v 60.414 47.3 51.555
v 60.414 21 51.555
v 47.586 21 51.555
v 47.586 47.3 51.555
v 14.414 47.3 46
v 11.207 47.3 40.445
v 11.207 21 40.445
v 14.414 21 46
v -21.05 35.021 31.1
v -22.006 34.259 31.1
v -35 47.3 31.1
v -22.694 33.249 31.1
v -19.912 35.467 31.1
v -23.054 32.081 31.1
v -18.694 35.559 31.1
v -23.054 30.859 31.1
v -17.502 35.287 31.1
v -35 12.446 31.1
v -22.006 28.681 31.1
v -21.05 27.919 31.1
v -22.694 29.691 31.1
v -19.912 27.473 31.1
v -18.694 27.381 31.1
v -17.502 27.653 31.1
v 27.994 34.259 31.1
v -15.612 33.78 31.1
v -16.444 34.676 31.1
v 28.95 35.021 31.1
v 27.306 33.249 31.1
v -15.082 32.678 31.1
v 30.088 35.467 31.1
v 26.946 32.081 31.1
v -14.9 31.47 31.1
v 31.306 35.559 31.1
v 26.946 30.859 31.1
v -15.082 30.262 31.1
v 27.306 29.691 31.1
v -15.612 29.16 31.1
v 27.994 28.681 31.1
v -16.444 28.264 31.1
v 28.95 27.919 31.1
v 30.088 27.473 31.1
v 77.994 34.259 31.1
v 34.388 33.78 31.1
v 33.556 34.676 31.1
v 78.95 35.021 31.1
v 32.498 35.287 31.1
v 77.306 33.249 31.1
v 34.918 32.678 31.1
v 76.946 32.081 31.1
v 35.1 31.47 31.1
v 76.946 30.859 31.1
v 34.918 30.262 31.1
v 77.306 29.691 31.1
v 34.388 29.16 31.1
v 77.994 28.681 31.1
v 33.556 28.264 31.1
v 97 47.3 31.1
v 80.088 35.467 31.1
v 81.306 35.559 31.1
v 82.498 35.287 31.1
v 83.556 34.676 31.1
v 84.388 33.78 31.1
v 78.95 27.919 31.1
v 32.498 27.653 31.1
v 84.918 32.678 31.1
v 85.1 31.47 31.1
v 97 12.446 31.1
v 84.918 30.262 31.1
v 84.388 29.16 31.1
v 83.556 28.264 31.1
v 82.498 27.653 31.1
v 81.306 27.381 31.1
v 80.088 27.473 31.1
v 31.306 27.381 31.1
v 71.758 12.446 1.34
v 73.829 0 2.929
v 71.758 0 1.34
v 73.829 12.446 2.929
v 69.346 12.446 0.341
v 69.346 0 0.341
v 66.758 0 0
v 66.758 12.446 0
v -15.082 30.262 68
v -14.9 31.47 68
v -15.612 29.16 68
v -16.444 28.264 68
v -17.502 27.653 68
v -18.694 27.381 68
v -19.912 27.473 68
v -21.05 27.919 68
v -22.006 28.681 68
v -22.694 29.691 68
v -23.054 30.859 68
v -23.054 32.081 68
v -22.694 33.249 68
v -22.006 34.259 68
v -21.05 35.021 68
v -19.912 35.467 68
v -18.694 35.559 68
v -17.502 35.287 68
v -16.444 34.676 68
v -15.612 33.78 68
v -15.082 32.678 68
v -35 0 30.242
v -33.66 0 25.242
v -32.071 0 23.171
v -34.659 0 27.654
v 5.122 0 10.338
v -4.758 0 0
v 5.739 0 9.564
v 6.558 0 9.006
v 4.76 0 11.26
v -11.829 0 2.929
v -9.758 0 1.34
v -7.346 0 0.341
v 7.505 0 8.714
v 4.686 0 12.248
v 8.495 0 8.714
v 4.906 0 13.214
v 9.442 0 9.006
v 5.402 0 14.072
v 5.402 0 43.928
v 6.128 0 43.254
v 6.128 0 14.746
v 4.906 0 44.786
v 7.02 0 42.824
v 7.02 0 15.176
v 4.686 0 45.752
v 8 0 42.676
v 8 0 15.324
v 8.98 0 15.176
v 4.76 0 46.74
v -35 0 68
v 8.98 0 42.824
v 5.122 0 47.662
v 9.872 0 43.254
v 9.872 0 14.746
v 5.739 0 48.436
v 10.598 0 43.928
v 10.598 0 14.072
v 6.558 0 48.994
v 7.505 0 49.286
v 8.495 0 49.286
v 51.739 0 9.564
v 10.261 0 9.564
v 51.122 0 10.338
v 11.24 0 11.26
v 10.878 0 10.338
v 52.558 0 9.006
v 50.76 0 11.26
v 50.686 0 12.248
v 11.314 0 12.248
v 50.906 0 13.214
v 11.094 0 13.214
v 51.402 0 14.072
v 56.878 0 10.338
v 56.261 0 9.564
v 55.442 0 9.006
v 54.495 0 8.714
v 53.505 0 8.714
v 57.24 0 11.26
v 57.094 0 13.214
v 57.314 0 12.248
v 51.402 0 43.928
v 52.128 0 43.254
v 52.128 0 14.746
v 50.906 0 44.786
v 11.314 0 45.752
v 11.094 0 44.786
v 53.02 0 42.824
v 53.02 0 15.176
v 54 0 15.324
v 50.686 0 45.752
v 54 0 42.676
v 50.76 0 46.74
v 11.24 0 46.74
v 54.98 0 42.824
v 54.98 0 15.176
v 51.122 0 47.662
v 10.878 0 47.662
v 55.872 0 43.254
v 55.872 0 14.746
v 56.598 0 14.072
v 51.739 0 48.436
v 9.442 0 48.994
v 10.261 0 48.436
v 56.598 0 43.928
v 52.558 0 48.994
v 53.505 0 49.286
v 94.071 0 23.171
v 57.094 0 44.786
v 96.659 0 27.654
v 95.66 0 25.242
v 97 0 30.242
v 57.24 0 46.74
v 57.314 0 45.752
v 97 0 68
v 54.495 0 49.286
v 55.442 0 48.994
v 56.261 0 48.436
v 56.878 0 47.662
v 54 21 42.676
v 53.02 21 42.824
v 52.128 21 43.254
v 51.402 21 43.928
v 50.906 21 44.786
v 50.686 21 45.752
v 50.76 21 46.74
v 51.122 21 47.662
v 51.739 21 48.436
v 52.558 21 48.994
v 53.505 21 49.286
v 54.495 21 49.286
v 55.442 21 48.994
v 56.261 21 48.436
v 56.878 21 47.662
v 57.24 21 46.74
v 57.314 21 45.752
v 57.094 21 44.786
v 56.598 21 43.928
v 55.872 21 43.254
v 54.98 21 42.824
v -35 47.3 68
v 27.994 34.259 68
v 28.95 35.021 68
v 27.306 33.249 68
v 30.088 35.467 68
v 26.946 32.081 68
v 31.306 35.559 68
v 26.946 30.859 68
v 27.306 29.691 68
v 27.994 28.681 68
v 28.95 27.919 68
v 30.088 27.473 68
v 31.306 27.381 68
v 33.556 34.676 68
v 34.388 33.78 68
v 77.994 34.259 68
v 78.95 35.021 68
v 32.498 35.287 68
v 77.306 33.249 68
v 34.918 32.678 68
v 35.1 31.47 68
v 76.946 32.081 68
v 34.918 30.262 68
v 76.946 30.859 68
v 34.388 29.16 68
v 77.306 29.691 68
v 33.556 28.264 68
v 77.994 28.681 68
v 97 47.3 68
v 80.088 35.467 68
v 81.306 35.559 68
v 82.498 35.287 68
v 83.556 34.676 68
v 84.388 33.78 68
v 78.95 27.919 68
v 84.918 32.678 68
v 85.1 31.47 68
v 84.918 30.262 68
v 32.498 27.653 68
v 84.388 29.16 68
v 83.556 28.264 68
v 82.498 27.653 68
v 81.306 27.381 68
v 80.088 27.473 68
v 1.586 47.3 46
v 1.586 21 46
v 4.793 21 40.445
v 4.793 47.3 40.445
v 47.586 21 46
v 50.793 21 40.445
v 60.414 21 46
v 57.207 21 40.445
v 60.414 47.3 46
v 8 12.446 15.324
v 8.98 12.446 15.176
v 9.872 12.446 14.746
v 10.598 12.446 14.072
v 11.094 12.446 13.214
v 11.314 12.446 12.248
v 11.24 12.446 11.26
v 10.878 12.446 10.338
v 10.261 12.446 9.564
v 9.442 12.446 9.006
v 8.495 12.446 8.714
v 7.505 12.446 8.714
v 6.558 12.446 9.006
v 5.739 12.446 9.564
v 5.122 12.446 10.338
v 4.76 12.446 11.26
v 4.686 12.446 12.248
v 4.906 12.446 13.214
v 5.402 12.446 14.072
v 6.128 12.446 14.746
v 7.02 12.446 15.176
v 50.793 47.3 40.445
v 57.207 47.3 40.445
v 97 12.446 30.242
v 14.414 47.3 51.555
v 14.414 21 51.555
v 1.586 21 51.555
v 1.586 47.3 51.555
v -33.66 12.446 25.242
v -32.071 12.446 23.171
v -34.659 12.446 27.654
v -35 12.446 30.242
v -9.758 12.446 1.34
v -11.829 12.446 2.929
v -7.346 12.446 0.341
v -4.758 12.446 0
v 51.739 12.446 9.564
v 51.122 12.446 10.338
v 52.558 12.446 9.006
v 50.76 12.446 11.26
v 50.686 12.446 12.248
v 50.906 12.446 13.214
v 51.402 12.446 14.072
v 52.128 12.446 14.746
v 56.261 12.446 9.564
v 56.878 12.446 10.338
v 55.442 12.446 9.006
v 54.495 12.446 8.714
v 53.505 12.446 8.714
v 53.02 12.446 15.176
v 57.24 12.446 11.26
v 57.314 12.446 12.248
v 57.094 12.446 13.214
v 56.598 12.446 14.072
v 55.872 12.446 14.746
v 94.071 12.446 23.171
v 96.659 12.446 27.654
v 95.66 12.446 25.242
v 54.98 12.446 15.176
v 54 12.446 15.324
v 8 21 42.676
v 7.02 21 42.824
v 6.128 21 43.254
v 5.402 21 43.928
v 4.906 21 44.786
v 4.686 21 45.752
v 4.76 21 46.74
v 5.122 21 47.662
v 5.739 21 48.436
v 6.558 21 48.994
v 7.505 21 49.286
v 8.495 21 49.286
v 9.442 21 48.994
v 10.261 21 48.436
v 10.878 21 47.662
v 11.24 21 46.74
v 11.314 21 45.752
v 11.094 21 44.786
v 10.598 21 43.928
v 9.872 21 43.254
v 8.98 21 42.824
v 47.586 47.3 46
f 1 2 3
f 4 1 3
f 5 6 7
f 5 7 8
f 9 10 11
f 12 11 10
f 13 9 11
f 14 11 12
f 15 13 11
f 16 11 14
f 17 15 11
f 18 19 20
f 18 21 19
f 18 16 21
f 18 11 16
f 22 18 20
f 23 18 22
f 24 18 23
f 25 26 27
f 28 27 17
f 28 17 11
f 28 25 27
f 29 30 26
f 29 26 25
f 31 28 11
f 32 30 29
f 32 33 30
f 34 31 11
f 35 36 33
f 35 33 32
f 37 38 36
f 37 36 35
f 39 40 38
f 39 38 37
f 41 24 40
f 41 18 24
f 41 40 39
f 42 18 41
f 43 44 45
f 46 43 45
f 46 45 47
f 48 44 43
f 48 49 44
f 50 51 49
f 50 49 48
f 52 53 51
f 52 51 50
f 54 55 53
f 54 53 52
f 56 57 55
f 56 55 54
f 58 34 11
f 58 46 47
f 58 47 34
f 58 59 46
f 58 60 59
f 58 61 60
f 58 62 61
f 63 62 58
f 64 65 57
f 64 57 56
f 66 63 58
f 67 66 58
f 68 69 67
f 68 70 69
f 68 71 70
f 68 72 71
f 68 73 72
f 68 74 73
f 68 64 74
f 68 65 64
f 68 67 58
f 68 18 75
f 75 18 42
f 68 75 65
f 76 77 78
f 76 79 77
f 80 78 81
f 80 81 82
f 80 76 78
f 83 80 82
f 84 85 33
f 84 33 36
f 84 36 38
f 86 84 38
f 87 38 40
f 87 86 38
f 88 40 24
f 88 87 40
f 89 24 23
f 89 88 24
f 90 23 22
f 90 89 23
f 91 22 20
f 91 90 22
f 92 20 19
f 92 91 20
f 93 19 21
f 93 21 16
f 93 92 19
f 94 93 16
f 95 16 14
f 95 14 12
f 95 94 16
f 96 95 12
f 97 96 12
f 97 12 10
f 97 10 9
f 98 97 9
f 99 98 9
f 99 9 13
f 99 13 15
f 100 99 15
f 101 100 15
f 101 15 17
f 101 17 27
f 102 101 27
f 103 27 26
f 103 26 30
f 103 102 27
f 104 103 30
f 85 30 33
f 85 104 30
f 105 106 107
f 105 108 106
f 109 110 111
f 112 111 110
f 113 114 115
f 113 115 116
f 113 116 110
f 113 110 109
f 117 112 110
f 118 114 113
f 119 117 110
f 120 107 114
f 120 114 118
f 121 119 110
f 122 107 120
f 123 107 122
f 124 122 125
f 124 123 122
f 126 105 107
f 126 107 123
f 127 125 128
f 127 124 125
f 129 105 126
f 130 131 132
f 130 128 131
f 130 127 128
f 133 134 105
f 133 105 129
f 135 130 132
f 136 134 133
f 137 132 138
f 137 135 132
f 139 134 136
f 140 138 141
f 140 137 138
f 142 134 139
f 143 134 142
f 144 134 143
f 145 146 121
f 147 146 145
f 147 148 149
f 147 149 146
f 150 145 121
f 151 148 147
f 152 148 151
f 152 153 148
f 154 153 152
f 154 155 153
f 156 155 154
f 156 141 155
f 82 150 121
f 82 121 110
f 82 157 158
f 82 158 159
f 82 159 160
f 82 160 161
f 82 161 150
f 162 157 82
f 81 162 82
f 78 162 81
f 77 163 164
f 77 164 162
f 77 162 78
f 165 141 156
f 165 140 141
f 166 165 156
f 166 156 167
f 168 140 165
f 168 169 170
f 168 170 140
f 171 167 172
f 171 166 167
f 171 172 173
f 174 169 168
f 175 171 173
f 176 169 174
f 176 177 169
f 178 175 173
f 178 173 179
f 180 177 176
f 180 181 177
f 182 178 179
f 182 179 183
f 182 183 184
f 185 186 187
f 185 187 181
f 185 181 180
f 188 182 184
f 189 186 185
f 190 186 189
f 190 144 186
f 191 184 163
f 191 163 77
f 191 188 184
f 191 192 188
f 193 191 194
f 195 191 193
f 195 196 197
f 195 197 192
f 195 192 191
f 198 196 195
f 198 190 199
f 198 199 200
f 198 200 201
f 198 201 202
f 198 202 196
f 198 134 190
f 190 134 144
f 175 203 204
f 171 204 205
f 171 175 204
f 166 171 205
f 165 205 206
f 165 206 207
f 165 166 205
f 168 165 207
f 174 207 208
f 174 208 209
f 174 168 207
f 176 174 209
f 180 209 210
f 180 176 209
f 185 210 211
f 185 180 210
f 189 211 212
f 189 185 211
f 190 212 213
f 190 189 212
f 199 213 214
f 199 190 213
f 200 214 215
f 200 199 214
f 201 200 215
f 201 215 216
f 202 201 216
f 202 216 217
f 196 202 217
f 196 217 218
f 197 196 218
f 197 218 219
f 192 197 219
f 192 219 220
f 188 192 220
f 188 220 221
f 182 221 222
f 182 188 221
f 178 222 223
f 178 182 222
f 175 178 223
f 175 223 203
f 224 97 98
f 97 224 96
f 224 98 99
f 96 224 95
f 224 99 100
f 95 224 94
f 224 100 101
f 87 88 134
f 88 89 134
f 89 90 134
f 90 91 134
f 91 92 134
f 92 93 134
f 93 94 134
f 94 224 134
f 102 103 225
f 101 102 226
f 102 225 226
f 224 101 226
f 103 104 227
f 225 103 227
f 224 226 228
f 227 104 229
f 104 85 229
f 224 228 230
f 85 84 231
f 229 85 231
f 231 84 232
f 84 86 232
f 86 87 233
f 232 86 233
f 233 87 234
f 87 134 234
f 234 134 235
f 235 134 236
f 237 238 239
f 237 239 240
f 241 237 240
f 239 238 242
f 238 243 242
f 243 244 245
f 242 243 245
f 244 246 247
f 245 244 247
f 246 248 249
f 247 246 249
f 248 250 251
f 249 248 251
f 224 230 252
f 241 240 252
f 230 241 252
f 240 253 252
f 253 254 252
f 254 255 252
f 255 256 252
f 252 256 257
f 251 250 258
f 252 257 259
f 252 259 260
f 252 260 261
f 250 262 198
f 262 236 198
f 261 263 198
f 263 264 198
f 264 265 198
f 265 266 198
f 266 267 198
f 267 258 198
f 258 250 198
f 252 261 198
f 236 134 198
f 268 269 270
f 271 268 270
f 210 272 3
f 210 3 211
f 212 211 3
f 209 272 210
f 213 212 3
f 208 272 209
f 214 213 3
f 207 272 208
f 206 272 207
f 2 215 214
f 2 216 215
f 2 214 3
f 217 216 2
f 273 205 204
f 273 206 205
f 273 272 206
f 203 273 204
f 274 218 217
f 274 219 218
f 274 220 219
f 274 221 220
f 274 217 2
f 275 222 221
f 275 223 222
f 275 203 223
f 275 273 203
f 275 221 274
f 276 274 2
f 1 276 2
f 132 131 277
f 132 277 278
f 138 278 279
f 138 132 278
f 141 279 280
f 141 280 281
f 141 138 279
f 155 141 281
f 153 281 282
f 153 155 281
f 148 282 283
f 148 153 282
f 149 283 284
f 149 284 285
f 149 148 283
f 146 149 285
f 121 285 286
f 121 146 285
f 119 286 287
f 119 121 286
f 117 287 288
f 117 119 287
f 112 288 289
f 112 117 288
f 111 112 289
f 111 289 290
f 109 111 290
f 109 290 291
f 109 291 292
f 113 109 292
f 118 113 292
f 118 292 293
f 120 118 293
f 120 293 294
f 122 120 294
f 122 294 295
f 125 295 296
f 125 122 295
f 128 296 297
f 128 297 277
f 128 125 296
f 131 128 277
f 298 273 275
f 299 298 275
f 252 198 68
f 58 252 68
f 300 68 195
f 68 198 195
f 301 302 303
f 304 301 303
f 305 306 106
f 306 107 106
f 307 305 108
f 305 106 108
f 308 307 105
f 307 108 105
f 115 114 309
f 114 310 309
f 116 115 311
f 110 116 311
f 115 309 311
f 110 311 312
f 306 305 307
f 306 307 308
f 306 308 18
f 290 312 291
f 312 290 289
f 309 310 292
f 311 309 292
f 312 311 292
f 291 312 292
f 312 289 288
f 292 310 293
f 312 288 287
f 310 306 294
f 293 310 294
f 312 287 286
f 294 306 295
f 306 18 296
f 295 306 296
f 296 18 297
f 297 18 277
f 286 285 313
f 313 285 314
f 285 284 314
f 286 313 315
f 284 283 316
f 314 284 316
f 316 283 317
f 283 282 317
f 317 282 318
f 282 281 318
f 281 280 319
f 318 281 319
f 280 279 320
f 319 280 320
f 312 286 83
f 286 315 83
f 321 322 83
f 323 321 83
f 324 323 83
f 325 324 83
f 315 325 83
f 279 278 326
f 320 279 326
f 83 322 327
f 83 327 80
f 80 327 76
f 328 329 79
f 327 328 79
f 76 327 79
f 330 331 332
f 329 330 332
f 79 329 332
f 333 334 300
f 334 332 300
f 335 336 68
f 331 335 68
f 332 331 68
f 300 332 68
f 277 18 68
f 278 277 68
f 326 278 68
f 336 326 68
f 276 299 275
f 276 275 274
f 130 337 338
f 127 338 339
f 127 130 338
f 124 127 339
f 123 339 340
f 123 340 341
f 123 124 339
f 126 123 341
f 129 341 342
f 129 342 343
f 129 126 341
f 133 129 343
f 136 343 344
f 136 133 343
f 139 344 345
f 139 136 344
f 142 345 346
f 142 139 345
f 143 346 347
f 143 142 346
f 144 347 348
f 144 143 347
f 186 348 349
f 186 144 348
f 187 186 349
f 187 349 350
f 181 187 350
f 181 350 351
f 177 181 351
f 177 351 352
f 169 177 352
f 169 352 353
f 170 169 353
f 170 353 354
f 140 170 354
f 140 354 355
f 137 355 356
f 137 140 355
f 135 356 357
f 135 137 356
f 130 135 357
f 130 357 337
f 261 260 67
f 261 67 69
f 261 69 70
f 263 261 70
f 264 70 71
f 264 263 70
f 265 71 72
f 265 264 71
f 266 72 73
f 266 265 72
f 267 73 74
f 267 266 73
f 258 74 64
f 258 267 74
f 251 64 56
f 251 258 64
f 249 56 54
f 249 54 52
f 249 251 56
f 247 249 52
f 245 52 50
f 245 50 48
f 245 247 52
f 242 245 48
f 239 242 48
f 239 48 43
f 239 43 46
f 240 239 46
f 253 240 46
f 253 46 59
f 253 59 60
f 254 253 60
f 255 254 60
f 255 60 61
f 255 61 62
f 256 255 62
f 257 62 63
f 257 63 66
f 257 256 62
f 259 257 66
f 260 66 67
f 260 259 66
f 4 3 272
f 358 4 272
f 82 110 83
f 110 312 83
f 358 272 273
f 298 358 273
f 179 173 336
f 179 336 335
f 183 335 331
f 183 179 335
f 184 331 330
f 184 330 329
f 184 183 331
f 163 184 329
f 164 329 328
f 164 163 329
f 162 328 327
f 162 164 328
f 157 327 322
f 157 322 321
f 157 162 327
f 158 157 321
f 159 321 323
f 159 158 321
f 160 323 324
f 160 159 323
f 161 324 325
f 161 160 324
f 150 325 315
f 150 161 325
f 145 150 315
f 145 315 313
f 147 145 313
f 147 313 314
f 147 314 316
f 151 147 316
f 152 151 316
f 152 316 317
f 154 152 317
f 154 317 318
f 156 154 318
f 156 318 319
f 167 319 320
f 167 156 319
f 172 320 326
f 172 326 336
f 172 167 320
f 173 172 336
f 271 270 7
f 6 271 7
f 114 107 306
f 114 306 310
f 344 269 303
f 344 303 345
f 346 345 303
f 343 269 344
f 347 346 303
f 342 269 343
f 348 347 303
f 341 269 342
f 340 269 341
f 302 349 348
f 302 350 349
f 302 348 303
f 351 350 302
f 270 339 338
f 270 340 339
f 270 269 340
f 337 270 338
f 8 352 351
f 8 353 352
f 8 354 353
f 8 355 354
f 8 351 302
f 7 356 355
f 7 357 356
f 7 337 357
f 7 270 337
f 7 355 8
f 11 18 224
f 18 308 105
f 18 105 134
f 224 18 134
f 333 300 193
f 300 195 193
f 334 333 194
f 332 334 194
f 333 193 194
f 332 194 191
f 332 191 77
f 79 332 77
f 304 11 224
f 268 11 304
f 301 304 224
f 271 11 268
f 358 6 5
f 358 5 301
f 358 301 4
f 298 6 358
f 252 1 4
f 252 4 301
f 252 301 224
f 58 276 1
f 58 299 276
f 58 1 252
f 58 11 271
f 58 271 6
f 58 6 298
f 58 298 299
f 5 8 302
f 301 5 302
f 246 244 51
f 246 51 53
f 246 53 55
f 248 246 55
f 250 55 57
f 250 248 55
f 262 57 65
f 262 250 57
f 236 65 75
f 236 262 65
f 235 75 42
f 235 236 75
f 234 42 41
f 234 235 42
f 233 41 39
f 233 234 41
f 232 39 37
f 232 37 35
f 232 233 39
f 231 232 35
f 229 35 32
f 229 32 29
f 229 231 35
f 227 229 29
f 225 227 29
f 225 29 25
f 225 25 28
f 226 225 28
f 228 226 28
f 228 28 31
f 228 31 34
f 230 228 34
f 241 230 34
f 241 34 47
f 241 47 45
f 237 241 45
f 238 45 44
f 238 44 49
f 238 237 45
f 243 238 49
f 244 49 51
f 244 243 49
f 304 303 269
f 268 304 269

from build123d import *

# Parameters (mm, degrees)
SKETCH1_W           = 62
SKETCH1_H           = 31.1
SKETCH1_R           = 3.3235
BOSS_EXTRUDE1_DEPTH = 12.446
SKETCH1_3_W         = 35
SKETCH1_3_H         = 36.9
SKETCH1_3_W_2       = 62
BOSS_EXTRUDE2_DEPTH = 47.3
SKETCH1_4_R         = 3.3235
BOSS_EXTRUDE3_DEPTH = 21
SKETCH2_R           = 4.1
CUT_EXTRUDE1_DEPTH  = 36.9
CHAMFER1_SIZE       = 40
FILLET3_R           = 10


with BuildPart() as part:
    # Sketch1 → Boss-Extrude1 (new body)
    with BuildSketch(Plane(origin=(0, 0, 0), x_dir=(1, 0, 0), z_dir=(0, 1, 0))):
        with Locations((31, -15.55)):
            Rectangle(SKETCH1_W, SKETCH1_H)
        with Locations(Location((8, -12, 0), (0, 0, 270))):
            Circle(SKETCH1_R, mode=Mode.SUBTRACT)
        with Locations(Location((54, -12, 0), (0, 0, 270))):
            Circle(SKETCH1_R, mode=Mode.SUBTRACT)
    extrude(amount=BOSS_EXTRUDE1_DEPTH)

    # Sketch1<3> → Boss-Extrude2 (add)
    # profile 1 of 3: a face of its own
    with BuildSketch(Plane(origin=(0, 0, 0), x_dir=(1, 0, 0), z_dir=(0, 1, 0))):
        with Locations((-17.5, -49.55)):
            Rectangle(SKETCH1_3_W, SKETCH1_3_H)
    # profile 2 of 3: a face of its own
    with BuildSketch(Plane(origin=(0, 0, 0), x_dir=(1, 0, 0), z_dir=(0, 1, 0))):
        with Locations((31, -49.55)):
            Rectangle(SKETCH1_3_W_2, SKETCH1_3_H)
        Polygon((1.585638509, -46), (4.792819255, -40.445), (11.207180745, -40.445), (14.414361491, -46), (14.414361491, -51.555), (11.207180745, -51.555), (4.792819255, -51.555), (1.585638509, -51.555), align=None, mode=Mode.SUBTRACT)
        Polygon((60.414361491, -46), (60.414361491, -51.555), (47.585638509, -51.555), (47.585638509, -46), (50.792819255, -40.445), (57.207180745, -40.445), align=None, mode=Mode.SUBTRACT)
    # profile 3 of 3: a face of its own
    with BuildSketch(Plane(origin=(0, 0, 0), x_dir=(1, 0, 0), z_dir=(0, 1, 0))):
        with Locations((79.5, -49.55)):
            Rectangle(SKETCH1_3_W, SKETCH1_3_H)
    extrude(amount=BOSS_EXTRUDE2_DEPTH)

    # Sketch1<4> → Boss-Extrude3 (add)
    # profile 1 of 2: a face of its own
    with BuildSketch(Plane(origin=(0, 0, 0), x_dir=(1, 0, 0), z_dir=(0, 1, 0))):
        Polygon((14.414361491, -46), (11.207180745, -40.445), (4.792819255, -40.445), (1.585638509, -46), (1.585638509, -51.555), (14.414361491, -51.555), align=None)
        with Locations(Location((8, -46, 0), (0, 0, 90))):
            Circle(SKETCH1_4_R, mode=Mode.SUBTRACT)
    # profile 2 of 2: a face of its own
    with BuildSketch(Plane(origin=(0, 0, 0), x_dir=(1, 0, 0), z_dir=(0, 1, 0))):
        Polygon((47.585638509, -51.555), (60.414361491, -51.555), (60.414361491, -46), (57.207180745, -40.445), (50.792819255, -40.445), (47.585638509, -46), align=None)
        with Locations(Location((54, -46, 0), (0, 0, 90))):
            Circle(SKETCH1_4_R, mode=Mode.SUBTRACT)
    extrude(amount=BOSS_EXTRUDE3_DEPTH)

    # Sketch2 → Cut-Extrude1 (cut)
    with BuildSketch(Plane(origin=(0, 0, 68), x_dir=(-1, 0, 0), z_dir=(0, 0, -1))):
        with Locations(Location((19, 31.47, 0), (0, 0, 180))):
            Circle(SKETCH2_R)
        with Locations(Location((-31, 31.47, 0), (0, 0, 180))):
            Circle(SKETCH2_R)
        with Locations(Location((-81, 31.47, 0), (0, 0, 180))):
            Circle(SKETCH2_R)
    extrude(amount=CUT_EXTRUDE1_DEPTH, mode=Mode.SUBTRACT)

    # Chamfer1
    # the kernel refuses this chamfer: 40 mm, written as the material it adds along each edge
    with BuildSketch(Plane(origin=(62, 0, 31.1), x_dir=(0.9996219169112968, 0, 0.02749587661058649), z_dir=(0, 1, 0))) as chamfer1_piece_1_section:
        Polygon((CHAMFER1_SIZE * 0.999621916911, CHAMFER1_SIZE * 0.0274958766106), (-CHAMFER1_SIZE * 0.0274958766106, CHAMFER1_SIZE * 0.999621916911), (0, 0), align=None)
    chamfer1_piece_1 = extrude(amount=12.446, mode=Mode.PRIVATE)
    chamfer1_piece_1 = split(chamfer1_piece_1, bisect_by=Plane(origin=(97, 6.223, 19.019433431), z_dir=(-1, 0, 0)), keep=Keep.TOP, mode=Mode.PRIVATE)
    chamfer1_piece_1 = split(chamfer1_piece_1, bisect_by=Plane(origin=(75.290949727, 6.223, 0), z_dir=(0, 0, 1)), keep=Keep.TOP, mode=Mode.PRIVATE)
    add(chamfer1_piece_1)
    with BuildSketch(Plane(origin=(0, 0, 31.1), x_dir=(-0.9996219169112968, 0, 0.027495876610586497), z_dir=(0, 1, 0))) as chamfer1_piece_2_section:
        Polygon((CHAMFER1_SIZE * 0.999621916911, -CHAMFER1_SIZE * 0.0274958766106), (-CHAMFER1_SIZE * 0.0274958766106, -CHAMFER1_SIZE * 0.999621916911), (0, 0), align=None)
    chamfer1_piece_2 = extrude(amount=12.446, mode=Mode.PRIVATE)
    chamfer1_piece_2 = split(chamfer1_piece_2, bisect_by=Plane(origin=(-35, 6.223, 19.019433431), z_dir=(1, 0, 0)), keep=Keep.TOP, mode=Mode.PRIVATE)
    chamfer1_piece_2 = split(chamfer1_piece_2, bisect_by=Plane(origin=(-13.290949727, 6.223, 0), z_dir=(0, 0, 1)), keep=Keep.TOP, mode=Mode.PRIVATE)
    add(chamfer1_piece_2)

    # Fillet3
    fillet3_edges = [part.edges().sort_by_distance(p)[0] for p in [
        (70.9, 6.223, 0),
        (97, 6.223, 26.1),
        (-35, 6.223, 26.1),
        (-8.9, 6.223, 0),
    ]]
    fillet(fillet3_edges, radius=FILLET3_R)


solid = part.part
